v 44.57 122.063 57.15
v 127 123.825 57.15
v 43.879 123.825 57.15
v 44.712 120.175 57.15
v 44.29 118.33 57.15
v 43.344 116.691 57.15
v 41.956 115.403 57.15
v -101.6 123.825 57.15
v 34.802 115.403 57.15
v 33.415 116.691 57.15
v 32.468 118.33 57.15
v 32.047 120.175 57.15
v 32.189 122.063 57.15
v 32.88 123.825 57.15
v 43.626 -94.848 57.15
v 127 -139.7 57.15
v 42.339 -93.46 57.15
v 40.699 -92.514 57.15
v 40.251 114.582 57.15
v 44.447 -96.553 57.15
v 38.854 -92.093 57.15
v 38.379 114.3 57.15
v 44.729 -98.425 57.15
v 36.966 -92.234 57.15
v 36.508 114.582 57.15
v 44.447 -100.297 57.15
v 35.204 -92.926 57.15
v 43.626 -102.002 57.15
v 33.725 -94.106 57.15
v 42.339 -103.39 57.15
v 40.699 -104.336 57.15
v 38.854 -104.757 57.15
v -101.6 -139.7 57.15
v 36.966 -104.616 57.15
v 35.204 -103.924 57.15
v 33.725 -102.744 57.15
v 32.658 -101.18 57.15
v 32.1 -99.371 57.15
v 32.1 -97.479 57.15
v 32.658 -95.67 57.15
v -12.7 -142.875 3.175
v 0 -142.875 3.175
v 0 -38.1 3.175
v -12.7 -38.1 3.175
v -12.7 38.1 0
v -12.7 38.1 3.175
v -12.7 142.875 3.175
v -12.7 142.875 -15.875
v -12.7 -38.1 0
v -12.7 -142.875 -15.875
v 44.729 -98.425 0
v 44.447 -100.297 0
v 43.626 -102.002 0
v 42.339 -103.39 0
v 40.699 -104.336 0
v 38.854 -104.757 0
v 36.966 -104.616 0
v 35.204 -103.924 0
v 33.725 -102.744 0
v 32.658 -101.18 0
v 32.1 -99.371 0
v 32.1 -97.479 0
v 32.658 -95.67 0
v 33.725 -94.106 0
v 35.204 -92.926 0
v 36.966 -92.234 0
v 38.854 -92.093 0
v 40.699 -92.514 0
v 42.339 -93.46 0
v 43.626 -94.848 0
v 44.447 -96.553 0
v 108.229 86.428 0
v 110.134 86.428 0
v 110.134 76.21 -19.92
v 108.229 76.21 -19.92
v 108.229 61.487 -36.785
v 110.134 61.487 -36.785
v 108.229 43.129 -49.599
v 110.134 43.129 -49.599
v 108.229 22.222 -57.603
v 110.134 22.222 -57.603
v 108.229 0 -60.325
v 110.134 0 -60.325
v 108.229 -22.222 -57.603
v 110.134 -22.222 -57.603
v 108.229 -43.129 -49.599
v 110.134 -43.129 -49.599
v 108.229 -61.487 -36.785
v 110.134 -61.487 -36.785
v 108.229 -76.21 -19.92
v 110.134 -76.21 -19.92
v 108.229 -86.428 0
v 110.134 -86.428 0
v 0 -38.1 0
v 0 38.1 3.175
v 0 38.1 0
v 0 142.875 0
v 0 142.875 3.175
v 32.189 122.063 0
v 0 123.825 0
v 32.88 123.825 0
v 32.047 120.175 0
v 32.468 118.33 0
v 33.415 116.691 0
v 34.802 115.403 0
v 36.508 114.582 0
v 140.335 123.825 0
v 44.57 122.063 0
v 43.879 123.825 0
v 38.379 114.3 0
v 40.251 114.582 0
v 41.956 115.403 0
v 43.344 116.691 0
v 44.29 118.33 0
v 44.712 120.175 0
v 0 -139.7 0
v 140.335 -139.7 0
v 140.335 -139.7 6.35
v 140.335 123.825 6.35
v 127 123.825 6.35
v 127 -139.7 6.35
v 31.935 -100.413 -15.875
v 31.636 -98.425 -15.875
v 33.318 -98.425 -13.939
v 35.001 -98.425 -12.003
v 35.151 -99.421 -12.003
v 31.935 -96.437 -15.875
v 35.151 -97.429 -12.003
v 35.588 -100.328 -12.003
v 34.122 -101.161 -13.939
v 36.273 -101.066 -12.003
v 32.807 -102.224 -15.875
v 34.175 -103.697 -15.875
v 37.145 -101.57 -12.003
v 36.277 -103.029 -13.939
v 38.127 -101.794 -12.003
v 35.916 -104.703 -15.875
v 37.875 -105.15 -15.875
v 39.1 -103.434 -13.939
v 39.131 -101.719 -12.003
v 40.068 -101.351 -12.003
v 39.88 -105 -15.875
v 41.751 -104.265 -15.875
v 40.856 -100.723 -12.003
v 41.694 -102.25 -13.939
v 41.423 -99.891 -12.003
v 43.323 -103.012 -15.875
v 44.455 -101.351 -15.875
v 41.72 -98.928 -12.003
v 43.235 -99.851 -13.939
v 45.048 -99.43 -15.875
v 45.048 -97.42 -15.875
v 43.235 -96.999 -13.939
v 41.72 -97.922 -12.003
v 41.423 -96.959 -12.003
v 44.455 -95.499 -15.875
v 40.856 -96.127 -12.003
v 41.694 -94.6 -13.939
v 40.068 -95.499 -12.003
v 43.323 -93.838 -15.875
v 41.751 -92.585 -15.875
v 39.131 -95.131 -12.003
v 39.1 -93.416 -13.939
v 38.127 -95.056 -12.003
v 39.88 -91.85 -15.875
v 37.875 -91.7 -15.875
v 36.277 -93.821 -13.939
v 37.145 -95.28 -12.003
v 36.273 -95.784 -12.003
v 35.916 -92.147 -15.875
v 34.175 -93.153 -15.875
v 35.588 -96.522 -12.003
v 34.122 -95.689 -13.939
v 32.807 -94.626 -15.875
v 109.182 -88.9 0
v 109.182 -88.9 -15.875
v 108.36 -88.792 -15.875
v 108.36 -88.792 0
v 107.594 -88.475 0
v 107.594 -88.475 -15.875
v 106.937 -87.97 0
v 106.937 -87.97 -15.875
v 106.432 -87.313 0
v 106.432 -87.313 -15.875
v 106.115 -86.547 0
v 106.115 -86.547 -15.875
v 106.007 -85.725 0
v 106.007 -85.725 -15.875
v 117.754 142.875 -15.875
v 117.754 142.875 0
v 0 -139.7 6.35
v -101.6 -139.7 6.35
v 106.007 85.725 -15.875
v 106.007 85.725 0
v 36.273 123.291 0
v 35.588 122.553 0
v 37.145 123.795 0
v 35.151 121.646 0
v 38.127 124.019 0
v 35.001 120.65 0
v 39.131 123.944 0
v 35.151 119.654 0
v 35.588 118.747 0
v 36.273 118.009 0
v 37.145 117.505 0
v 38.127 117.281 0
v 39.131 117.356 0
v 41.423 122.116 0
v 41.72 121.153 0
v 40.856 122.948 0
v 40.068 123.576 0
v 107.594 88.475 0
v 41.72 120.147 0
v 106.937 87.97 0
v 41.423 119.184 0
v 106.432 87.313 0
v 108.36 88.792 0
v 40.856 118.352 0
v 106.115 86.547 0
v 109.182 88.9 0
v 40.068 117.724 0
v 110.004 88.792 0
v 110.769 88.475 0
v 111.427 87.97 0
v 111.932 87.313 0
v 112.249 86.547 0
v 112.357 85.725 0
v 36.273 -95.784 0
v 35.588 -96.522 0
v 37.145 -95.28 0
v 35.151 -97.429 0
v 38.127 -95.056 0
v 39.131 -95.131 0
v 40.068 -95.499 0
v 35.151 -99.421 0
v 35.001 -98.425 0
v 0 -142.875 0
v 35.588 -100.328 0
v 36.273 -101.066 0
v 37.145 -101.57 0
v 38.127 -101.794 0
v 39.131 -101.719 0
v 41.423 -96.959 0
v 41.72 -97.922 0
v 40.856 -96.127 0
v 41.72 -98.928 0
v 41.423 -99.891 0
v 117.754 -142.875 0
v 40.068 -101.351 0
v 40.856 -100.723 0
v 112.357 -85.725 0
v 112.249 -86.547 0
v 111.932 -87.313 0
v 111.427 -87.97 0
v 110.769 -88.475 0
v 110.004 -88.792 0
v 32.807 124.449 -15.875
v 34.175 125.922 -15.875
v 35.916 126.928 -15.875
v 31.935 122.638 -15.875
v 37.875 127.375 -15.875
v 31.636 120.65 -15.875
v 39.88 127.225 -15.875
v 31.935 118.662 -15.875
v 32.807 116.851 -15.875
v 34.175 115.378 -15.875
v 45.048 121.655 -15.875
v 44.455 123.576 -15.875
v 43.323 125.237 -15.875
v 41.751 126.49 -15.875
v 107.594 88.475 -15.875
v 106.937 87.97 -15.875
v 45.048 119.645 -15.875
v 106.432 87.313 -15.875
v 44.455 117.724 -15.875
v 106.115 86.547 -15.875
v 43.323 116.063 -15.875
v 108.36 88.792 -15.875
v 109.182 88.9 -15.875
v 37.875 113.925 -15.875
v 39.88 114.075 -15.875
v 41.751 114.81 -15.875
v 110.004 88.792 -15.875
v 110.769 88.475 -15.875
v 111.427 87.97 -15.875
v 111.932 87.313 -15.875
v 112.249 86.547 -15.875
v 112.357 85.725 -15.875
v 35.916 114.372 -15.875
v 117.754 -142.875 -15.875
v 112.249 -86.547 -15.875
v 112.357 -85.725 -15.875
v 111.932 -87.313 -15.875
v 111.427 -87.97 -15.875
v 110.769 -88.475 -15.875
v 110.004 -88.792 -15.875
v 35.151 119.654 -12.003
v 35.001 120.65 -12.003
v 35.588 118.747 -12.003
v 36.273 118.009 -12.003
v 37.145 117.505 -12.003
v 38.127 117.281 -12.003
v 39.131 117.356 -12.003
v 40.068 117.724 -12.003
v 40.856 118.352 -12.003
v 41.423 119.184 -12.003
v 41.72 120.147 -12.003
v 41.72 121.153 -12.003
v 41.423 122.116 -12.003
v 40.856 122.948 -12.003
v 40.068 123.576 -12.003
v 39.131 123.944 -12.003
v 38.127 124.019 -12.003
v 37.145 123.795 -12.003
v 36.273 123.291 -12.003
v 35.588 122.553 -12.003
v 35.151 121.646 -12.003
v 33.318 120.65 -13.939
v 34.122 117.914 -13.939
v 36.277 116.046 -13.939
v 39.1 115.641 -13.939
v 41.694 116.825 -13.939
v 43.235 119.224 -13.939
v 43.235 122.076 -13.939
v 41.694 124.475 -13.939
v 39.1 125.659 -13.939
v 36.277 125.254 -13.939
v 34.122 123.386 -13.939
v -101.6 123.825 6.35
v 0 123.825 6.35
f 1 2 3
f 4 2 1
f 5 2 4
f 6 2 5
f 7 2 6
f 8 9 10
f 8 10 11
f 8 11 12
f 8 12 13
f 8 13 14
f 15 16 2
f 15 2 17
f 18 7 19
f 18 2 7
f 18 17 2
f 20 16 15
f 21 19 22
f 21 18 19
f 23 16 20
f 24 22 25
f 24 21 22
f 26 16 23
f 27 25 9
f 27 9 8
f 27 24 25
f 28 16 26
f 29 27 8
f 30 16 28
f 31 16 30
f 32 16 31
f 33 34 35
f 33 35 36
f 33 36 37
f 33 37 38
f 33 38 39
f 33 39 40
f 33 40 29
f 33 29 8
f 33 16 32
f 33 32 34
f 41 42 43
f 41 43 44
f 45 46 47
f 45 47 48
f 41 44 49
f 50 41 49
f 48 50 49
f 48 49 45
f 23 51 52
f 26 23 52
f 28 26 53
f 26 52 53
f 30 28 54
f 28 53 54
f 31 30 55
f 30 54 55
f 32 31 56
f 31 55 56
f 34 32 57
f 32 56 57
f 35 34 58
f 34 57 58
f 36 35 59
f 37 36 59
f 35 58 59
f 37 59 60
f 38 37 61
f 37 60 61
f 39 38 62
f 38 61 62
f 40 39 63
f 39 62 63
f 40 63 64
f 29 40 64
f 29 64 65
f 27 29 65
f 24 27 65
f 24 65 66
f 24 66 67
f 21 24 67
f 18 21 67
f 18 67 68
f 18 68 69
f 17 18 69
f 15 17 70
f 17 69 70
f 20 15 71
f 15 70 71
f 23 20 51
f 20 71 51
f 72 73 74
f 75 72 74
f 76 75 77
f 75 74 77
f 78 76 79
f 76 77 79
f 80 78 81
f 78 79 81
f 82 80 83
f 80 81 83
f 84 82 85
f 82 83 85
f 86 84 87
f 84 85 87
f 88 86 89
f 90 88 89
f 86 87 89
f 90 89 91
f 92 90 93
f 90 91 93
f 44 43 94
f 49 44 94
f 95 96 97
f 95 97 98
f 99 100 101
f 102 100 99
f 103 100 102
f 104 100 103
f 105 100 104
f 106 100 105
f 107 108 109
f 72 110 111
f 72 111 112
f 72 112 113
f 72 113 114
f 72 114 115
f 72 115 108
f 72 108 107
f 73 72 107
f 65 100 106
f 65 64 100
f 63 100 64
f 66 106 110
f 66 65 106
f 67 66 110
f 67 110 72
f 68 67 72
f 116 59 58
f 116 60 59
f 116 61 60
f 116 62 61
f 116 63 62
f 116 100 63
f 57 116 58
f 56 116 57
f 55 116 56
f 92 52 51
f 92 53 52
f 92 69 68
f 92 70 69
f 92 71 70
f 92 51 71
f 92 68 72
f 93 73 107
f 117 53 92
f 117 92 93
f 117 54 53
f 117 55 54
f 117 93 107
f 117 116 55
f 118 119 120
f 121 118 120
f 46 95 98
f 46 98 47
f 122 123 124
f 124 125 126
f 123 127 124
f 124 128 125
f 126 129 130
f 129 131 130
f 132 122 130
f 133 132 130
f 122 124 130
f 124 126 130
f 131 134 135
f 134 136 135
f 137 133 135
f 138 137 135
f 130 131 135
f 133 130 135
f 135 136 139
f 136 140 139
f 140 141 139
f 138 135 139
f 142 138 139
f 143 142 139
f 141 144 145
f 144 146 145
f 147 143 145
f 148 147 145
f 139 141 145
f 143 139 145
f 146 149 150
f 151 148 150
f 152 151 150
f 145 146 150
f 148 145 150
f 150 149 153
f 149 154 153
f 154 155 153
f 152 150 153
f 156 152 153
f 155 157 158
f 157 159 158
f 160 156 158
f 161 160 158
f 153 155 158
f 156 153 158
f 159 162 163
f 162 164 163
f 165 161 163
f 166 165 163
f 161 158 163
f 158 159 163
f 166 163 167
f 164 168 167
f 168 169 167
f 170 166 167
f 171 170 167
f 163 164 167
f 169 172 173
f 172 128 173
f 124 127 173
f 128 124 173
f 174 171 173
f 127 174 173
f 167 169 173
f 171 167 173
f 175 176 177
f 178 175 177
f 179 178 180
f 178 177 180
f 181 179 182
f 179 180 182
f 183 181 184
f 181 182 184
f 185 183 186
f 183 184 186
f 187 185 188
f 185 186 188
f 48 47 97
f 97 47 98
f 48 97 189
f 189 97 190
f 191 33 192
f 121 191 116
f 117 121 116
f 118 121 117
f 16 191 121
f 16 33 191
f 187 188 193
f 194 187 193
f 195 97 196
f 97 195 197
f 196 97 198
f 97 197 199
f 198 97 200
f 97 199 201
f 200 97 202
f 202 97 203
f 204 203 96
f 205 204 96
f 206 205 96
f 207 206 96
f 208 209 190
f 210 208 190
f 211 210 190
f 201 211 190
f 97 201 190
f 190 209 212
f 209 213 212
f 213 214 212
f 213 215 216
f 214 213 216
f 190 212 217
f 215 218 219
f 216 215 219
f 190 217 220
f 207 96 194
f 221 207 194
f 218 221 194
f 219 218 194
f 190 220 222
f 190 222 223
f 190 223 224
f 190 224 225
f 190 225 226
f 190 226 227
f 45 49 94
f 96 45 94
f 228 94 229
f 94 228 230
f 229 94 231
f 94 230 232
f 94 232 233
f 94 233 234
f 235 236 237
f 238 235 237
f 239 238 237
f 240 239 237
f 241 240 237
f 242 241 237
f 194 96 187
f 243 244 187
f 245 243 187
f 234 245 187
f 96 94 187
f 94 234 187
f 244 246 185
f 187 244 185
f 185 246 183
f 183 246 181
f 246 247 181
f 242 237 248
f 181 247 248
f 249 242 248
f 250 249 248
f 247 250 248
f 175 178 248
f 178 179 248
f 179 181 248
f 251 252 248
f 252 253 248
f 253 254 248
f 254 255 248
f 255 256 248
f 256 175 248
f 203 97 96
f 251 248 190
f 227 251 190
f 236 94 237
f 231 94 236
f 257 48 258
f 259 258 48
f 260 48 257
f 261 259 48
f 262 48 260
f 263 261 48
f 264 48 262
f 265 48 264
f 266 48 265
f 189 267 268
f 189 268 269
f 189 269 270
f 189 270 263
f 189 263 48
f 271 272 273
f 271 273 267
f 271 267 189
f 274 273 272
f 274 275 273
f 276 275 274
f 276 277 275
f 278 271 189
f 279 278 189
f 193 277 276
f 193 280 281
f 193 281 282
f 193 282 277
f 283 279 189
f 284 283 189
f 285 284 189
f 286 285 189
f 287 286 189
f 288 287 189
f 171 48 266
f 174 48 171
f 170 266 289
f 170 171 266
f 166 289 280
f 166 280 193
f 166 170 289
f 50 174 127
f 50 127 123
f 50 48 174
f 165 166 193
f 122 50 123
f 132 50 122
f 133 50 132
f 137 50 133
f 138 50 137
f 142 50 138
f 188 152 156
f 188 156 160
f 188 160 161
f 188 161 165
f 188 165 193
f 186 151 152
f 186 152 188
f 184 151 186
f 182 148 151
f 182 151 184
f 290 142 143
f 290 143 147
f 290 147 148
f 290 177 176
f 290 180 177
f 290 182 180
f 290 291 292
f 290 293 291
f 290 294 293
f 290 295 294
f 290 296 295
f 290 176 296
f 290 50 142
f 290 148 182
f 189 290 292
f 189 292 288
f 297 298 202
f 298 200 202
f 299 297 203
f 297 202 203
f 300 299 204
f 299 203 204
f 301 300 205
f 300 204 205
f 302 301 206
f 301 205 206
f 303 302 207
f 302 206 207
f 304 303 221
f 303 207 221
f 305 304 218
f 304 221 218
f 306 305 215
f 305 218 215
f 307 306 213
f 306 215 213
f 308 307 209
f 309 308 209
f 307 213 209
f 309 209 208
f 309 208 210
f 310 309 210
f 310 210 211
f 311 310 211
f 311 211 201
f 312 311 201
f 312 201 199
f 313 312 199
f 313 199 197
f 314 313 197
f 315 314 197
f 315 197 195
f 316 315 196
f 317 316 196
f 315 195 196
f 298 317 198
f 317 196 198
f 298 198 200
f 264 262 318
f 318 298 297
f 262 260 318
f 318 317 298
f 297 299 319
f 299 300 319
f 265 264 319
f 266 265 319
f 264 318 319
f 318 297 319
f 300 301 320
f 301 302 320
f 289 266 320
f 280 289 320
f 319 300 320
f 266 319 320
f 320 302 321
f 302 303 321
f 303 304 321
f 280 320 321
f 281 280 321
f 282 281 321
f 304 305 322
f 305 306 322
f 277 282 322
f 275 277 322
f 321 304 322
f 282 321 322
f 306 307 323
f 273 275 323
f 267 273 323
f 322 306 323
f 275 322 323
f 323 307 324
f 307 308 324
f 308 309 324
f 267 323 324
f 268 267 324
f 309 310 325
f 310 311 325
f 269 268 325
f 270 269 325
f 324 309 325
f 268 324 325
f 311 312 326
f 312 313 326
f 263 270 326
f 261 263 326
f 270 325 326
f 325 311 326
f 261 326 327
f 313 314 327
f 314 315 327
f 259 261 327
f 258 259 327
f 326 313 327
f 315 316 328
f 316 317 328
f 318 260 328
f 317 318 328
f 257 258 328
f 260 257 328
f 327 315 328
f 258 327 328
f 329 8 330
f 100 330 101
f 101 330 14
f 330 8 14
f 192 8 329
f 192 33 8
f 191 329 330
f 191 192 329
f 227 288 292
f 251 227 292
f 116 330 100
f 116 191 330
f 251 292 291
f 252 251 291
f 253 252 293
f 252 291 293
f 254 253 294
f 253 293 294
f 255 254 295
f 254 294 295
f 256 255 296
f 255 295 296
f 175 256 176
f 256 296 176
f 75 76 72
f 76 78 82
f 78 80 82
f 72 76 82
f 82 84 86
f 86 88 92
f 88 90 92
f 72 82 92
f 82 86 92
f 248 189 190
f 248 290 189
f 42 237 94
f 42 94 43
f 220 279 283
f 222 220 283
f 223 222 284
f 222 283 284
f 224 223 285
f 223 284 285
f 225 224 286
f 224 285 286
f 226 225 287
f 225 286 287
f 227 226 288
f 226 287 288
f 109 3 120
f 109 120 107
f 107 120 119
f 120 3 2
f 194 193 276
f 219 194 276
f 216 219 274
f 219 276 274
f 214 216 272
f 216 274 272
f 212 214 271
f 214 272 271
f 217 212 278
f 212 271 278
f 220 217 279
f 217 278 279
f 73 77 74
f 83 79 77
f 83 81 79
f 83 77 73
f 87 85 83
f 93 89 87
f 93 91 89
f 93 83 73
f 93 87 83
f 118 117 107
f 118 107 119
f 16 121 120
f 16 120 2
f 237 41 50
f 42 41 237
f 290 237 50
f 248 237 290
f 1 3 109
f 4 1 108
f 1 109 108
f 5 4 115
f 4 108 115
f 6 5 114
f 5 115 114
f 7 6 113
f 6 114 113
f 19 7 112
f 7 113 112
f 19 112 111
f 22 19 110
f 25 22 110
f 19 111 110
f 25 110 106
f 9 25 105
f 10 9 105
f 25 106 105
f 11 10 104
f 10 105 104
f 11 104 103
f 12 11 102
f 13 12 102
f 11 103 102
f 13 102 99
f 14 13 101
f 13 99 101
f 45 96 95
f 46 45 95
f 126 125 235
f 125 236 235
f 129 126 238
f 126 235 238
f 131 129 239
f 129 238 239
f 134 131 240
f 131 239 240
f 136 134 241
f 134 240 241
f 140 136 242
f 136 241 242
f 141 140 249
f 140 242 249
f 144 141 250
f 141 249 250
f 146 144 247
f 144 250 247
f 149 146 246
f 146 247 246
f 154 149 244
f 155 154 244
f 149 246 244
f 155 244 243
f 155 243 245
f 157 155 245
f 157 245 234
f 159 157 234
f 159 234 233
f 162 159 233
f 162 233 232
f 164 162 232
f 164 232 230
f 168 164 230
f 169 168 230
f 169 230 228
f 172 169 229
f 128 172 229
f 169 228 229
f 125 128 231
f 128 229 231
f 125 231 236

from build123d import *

# Parameters (mm, degrees)
F0_W            = 1.905
F0_H            = 60.96
F1_DEPTH        = 139.7
F1_DEPTH_BACK   = 123.825
F2_W            = 117.7544
F2_H            = 15.875
F3_DEPTH        = 142.875
F3_DEPTH_BACK   = 142.875
F6_DEPTH        = 1.905
F7_R            = 6.35
F8_DEPTH        = 57.15
F11_D           = 6.7564
F11_CSINK_D     = 13.4874
F11_CSINK_ANGLE = 82
F12_DEPTH       = 73.025
F14_DEPTH       = 12.7


with BuildPart() as f1:
    # F0 (on Front) → F1 (new body, two sides)
    with BuildSketch(Plane.XZ) as f1_sk:
        Polygon((0, 6.35), (0, 0), (108.2294, 0), (110.1344, 0), (140.335, 0), (140.335, 6.35), (127, 6.35), align=None)
        with Locations((109.1819, -30.48)):
            Rectangle(F0_W, F0_H)
        Polygon((-101.6, 6.35), (0, 6.35), (127, 6.35), (127, 57.15), (-101.6, 57.15), align=None)
    extrude(amount=F1_DEPTH)
    extrude(f1_sk.sketch, amount=-F1_DEPTH_BACK)

    # F5 (on face) → F6 (cut, through all)
    with BuildSketch(Plane.YZ.offset(110.1344)):
        with BuildLine():
            Line((-86.427675689, 0), (-139.7, 0))
            Line((-139.7, 0), (-139.7, -60.96))
            Line((-139.7, -60.96), (-139.7, -88.9))
            Line((-139.7, -88.9), (152.4, -88.9))
            Line((152.4, -88.9), (152.4, 0))
            Line((152.4, 0), (123.825, 0))
            Line((123.825, 0), (86.427675689, 0))
            ThreePointArc((86.427675689, 0), (0, -60.325), (-86.427675689, 0))
        make_face()
    extrude(amount=-F6_DEPTH, mode=Mode.SUBTRACT)

    # F7 (on face) → F8 (cut, through all)
    with BuildSketch(Plane(origin=(0, 0, 0), x_dir=(1, 0, 0), z_dir=(0, 0, -1))):
        with Locations((38.3794, -120.65)):
            Circle(F7_R)
        with Locations((38.3794, 98.425)):
            Circle(F7_R)
    extrude(amount=-F8_DEPTH, mode=Mode.SUBTRACT)


with BuildPart() as f3:
    # F2 (on Front) → F3 (new body, two sides)
    with BuildSketch(Plane.XZ) as f3_sk:
        with Locations((58.8772, -7.9375)):
            Rectangle(F2_W, F2_H)
        Polygon((0, -15.875), (0, 0), (0, 3.175), (-12.7, 3.175), (-12.7, -15.875), align=None)
    extrude(amount=F3_DEPTH)
    extrude(f3_sk.sketch, amount=-F3_DEPTH_BACK)

    # F11 (through all)
    with Locations(Plane(origin=(0, 0, -15.875), x_dir=(1, 0, 0), z_dir=(0, 0, -1))):
        with Locations((38.3794, -120.65), (38.3794, 98.425)):
            CounterSinkHole(F11_D / 2, F11_CSINK_D / 2, counter_sink_angle=F11_CSINK_ANGLE)

    # F4 (on face) → F12 (cut, through all)
    with BuildSketch(Plane(origin=(0, 0, -15.875), x_dir=(1, 0, 0), z_dir=(0, 0, -1))):
        with BuildLine():
            Line((112.3569, -85.725), (112.3569, 85.725))
            ThreePointArc((112.3569, 85.725), (111.4269640303, 87.9700640303), (109.1819, 88.9))
            ThreePointArc((109.1819, 88.9), (106.9368359697, 87.9700640303), (106.0069, 85.725))
            Line((106.0069, 85.725), (106.0069, -85.725))
            ThreePointArc((106.0069, -85.725), (106.9368359697, -87.9700640303), (109.1819, -88.9))
            ThreePointArc((109.1819, -88.9), (111.4269640303, -87.9700640303), (112.3569, -85.725))
        make_face()
    extrude(amount=-F12_DEPTH, mode=Mode.SUBTRACT)

    # F13 (on face) → F14 (cut, through all)
    with BuildSketch(Plane.YZ):
        Polygon((-38.1, 0), (0, 0), (38.1, 0), (38.1, 3.175), (0, 3.175), (-38.1, 3.175), align=None)
    extrude(amount=-F14_DEPTH, mode=Mode.SUBTRACT)


solid = Compound([f1.part, f3.part])
